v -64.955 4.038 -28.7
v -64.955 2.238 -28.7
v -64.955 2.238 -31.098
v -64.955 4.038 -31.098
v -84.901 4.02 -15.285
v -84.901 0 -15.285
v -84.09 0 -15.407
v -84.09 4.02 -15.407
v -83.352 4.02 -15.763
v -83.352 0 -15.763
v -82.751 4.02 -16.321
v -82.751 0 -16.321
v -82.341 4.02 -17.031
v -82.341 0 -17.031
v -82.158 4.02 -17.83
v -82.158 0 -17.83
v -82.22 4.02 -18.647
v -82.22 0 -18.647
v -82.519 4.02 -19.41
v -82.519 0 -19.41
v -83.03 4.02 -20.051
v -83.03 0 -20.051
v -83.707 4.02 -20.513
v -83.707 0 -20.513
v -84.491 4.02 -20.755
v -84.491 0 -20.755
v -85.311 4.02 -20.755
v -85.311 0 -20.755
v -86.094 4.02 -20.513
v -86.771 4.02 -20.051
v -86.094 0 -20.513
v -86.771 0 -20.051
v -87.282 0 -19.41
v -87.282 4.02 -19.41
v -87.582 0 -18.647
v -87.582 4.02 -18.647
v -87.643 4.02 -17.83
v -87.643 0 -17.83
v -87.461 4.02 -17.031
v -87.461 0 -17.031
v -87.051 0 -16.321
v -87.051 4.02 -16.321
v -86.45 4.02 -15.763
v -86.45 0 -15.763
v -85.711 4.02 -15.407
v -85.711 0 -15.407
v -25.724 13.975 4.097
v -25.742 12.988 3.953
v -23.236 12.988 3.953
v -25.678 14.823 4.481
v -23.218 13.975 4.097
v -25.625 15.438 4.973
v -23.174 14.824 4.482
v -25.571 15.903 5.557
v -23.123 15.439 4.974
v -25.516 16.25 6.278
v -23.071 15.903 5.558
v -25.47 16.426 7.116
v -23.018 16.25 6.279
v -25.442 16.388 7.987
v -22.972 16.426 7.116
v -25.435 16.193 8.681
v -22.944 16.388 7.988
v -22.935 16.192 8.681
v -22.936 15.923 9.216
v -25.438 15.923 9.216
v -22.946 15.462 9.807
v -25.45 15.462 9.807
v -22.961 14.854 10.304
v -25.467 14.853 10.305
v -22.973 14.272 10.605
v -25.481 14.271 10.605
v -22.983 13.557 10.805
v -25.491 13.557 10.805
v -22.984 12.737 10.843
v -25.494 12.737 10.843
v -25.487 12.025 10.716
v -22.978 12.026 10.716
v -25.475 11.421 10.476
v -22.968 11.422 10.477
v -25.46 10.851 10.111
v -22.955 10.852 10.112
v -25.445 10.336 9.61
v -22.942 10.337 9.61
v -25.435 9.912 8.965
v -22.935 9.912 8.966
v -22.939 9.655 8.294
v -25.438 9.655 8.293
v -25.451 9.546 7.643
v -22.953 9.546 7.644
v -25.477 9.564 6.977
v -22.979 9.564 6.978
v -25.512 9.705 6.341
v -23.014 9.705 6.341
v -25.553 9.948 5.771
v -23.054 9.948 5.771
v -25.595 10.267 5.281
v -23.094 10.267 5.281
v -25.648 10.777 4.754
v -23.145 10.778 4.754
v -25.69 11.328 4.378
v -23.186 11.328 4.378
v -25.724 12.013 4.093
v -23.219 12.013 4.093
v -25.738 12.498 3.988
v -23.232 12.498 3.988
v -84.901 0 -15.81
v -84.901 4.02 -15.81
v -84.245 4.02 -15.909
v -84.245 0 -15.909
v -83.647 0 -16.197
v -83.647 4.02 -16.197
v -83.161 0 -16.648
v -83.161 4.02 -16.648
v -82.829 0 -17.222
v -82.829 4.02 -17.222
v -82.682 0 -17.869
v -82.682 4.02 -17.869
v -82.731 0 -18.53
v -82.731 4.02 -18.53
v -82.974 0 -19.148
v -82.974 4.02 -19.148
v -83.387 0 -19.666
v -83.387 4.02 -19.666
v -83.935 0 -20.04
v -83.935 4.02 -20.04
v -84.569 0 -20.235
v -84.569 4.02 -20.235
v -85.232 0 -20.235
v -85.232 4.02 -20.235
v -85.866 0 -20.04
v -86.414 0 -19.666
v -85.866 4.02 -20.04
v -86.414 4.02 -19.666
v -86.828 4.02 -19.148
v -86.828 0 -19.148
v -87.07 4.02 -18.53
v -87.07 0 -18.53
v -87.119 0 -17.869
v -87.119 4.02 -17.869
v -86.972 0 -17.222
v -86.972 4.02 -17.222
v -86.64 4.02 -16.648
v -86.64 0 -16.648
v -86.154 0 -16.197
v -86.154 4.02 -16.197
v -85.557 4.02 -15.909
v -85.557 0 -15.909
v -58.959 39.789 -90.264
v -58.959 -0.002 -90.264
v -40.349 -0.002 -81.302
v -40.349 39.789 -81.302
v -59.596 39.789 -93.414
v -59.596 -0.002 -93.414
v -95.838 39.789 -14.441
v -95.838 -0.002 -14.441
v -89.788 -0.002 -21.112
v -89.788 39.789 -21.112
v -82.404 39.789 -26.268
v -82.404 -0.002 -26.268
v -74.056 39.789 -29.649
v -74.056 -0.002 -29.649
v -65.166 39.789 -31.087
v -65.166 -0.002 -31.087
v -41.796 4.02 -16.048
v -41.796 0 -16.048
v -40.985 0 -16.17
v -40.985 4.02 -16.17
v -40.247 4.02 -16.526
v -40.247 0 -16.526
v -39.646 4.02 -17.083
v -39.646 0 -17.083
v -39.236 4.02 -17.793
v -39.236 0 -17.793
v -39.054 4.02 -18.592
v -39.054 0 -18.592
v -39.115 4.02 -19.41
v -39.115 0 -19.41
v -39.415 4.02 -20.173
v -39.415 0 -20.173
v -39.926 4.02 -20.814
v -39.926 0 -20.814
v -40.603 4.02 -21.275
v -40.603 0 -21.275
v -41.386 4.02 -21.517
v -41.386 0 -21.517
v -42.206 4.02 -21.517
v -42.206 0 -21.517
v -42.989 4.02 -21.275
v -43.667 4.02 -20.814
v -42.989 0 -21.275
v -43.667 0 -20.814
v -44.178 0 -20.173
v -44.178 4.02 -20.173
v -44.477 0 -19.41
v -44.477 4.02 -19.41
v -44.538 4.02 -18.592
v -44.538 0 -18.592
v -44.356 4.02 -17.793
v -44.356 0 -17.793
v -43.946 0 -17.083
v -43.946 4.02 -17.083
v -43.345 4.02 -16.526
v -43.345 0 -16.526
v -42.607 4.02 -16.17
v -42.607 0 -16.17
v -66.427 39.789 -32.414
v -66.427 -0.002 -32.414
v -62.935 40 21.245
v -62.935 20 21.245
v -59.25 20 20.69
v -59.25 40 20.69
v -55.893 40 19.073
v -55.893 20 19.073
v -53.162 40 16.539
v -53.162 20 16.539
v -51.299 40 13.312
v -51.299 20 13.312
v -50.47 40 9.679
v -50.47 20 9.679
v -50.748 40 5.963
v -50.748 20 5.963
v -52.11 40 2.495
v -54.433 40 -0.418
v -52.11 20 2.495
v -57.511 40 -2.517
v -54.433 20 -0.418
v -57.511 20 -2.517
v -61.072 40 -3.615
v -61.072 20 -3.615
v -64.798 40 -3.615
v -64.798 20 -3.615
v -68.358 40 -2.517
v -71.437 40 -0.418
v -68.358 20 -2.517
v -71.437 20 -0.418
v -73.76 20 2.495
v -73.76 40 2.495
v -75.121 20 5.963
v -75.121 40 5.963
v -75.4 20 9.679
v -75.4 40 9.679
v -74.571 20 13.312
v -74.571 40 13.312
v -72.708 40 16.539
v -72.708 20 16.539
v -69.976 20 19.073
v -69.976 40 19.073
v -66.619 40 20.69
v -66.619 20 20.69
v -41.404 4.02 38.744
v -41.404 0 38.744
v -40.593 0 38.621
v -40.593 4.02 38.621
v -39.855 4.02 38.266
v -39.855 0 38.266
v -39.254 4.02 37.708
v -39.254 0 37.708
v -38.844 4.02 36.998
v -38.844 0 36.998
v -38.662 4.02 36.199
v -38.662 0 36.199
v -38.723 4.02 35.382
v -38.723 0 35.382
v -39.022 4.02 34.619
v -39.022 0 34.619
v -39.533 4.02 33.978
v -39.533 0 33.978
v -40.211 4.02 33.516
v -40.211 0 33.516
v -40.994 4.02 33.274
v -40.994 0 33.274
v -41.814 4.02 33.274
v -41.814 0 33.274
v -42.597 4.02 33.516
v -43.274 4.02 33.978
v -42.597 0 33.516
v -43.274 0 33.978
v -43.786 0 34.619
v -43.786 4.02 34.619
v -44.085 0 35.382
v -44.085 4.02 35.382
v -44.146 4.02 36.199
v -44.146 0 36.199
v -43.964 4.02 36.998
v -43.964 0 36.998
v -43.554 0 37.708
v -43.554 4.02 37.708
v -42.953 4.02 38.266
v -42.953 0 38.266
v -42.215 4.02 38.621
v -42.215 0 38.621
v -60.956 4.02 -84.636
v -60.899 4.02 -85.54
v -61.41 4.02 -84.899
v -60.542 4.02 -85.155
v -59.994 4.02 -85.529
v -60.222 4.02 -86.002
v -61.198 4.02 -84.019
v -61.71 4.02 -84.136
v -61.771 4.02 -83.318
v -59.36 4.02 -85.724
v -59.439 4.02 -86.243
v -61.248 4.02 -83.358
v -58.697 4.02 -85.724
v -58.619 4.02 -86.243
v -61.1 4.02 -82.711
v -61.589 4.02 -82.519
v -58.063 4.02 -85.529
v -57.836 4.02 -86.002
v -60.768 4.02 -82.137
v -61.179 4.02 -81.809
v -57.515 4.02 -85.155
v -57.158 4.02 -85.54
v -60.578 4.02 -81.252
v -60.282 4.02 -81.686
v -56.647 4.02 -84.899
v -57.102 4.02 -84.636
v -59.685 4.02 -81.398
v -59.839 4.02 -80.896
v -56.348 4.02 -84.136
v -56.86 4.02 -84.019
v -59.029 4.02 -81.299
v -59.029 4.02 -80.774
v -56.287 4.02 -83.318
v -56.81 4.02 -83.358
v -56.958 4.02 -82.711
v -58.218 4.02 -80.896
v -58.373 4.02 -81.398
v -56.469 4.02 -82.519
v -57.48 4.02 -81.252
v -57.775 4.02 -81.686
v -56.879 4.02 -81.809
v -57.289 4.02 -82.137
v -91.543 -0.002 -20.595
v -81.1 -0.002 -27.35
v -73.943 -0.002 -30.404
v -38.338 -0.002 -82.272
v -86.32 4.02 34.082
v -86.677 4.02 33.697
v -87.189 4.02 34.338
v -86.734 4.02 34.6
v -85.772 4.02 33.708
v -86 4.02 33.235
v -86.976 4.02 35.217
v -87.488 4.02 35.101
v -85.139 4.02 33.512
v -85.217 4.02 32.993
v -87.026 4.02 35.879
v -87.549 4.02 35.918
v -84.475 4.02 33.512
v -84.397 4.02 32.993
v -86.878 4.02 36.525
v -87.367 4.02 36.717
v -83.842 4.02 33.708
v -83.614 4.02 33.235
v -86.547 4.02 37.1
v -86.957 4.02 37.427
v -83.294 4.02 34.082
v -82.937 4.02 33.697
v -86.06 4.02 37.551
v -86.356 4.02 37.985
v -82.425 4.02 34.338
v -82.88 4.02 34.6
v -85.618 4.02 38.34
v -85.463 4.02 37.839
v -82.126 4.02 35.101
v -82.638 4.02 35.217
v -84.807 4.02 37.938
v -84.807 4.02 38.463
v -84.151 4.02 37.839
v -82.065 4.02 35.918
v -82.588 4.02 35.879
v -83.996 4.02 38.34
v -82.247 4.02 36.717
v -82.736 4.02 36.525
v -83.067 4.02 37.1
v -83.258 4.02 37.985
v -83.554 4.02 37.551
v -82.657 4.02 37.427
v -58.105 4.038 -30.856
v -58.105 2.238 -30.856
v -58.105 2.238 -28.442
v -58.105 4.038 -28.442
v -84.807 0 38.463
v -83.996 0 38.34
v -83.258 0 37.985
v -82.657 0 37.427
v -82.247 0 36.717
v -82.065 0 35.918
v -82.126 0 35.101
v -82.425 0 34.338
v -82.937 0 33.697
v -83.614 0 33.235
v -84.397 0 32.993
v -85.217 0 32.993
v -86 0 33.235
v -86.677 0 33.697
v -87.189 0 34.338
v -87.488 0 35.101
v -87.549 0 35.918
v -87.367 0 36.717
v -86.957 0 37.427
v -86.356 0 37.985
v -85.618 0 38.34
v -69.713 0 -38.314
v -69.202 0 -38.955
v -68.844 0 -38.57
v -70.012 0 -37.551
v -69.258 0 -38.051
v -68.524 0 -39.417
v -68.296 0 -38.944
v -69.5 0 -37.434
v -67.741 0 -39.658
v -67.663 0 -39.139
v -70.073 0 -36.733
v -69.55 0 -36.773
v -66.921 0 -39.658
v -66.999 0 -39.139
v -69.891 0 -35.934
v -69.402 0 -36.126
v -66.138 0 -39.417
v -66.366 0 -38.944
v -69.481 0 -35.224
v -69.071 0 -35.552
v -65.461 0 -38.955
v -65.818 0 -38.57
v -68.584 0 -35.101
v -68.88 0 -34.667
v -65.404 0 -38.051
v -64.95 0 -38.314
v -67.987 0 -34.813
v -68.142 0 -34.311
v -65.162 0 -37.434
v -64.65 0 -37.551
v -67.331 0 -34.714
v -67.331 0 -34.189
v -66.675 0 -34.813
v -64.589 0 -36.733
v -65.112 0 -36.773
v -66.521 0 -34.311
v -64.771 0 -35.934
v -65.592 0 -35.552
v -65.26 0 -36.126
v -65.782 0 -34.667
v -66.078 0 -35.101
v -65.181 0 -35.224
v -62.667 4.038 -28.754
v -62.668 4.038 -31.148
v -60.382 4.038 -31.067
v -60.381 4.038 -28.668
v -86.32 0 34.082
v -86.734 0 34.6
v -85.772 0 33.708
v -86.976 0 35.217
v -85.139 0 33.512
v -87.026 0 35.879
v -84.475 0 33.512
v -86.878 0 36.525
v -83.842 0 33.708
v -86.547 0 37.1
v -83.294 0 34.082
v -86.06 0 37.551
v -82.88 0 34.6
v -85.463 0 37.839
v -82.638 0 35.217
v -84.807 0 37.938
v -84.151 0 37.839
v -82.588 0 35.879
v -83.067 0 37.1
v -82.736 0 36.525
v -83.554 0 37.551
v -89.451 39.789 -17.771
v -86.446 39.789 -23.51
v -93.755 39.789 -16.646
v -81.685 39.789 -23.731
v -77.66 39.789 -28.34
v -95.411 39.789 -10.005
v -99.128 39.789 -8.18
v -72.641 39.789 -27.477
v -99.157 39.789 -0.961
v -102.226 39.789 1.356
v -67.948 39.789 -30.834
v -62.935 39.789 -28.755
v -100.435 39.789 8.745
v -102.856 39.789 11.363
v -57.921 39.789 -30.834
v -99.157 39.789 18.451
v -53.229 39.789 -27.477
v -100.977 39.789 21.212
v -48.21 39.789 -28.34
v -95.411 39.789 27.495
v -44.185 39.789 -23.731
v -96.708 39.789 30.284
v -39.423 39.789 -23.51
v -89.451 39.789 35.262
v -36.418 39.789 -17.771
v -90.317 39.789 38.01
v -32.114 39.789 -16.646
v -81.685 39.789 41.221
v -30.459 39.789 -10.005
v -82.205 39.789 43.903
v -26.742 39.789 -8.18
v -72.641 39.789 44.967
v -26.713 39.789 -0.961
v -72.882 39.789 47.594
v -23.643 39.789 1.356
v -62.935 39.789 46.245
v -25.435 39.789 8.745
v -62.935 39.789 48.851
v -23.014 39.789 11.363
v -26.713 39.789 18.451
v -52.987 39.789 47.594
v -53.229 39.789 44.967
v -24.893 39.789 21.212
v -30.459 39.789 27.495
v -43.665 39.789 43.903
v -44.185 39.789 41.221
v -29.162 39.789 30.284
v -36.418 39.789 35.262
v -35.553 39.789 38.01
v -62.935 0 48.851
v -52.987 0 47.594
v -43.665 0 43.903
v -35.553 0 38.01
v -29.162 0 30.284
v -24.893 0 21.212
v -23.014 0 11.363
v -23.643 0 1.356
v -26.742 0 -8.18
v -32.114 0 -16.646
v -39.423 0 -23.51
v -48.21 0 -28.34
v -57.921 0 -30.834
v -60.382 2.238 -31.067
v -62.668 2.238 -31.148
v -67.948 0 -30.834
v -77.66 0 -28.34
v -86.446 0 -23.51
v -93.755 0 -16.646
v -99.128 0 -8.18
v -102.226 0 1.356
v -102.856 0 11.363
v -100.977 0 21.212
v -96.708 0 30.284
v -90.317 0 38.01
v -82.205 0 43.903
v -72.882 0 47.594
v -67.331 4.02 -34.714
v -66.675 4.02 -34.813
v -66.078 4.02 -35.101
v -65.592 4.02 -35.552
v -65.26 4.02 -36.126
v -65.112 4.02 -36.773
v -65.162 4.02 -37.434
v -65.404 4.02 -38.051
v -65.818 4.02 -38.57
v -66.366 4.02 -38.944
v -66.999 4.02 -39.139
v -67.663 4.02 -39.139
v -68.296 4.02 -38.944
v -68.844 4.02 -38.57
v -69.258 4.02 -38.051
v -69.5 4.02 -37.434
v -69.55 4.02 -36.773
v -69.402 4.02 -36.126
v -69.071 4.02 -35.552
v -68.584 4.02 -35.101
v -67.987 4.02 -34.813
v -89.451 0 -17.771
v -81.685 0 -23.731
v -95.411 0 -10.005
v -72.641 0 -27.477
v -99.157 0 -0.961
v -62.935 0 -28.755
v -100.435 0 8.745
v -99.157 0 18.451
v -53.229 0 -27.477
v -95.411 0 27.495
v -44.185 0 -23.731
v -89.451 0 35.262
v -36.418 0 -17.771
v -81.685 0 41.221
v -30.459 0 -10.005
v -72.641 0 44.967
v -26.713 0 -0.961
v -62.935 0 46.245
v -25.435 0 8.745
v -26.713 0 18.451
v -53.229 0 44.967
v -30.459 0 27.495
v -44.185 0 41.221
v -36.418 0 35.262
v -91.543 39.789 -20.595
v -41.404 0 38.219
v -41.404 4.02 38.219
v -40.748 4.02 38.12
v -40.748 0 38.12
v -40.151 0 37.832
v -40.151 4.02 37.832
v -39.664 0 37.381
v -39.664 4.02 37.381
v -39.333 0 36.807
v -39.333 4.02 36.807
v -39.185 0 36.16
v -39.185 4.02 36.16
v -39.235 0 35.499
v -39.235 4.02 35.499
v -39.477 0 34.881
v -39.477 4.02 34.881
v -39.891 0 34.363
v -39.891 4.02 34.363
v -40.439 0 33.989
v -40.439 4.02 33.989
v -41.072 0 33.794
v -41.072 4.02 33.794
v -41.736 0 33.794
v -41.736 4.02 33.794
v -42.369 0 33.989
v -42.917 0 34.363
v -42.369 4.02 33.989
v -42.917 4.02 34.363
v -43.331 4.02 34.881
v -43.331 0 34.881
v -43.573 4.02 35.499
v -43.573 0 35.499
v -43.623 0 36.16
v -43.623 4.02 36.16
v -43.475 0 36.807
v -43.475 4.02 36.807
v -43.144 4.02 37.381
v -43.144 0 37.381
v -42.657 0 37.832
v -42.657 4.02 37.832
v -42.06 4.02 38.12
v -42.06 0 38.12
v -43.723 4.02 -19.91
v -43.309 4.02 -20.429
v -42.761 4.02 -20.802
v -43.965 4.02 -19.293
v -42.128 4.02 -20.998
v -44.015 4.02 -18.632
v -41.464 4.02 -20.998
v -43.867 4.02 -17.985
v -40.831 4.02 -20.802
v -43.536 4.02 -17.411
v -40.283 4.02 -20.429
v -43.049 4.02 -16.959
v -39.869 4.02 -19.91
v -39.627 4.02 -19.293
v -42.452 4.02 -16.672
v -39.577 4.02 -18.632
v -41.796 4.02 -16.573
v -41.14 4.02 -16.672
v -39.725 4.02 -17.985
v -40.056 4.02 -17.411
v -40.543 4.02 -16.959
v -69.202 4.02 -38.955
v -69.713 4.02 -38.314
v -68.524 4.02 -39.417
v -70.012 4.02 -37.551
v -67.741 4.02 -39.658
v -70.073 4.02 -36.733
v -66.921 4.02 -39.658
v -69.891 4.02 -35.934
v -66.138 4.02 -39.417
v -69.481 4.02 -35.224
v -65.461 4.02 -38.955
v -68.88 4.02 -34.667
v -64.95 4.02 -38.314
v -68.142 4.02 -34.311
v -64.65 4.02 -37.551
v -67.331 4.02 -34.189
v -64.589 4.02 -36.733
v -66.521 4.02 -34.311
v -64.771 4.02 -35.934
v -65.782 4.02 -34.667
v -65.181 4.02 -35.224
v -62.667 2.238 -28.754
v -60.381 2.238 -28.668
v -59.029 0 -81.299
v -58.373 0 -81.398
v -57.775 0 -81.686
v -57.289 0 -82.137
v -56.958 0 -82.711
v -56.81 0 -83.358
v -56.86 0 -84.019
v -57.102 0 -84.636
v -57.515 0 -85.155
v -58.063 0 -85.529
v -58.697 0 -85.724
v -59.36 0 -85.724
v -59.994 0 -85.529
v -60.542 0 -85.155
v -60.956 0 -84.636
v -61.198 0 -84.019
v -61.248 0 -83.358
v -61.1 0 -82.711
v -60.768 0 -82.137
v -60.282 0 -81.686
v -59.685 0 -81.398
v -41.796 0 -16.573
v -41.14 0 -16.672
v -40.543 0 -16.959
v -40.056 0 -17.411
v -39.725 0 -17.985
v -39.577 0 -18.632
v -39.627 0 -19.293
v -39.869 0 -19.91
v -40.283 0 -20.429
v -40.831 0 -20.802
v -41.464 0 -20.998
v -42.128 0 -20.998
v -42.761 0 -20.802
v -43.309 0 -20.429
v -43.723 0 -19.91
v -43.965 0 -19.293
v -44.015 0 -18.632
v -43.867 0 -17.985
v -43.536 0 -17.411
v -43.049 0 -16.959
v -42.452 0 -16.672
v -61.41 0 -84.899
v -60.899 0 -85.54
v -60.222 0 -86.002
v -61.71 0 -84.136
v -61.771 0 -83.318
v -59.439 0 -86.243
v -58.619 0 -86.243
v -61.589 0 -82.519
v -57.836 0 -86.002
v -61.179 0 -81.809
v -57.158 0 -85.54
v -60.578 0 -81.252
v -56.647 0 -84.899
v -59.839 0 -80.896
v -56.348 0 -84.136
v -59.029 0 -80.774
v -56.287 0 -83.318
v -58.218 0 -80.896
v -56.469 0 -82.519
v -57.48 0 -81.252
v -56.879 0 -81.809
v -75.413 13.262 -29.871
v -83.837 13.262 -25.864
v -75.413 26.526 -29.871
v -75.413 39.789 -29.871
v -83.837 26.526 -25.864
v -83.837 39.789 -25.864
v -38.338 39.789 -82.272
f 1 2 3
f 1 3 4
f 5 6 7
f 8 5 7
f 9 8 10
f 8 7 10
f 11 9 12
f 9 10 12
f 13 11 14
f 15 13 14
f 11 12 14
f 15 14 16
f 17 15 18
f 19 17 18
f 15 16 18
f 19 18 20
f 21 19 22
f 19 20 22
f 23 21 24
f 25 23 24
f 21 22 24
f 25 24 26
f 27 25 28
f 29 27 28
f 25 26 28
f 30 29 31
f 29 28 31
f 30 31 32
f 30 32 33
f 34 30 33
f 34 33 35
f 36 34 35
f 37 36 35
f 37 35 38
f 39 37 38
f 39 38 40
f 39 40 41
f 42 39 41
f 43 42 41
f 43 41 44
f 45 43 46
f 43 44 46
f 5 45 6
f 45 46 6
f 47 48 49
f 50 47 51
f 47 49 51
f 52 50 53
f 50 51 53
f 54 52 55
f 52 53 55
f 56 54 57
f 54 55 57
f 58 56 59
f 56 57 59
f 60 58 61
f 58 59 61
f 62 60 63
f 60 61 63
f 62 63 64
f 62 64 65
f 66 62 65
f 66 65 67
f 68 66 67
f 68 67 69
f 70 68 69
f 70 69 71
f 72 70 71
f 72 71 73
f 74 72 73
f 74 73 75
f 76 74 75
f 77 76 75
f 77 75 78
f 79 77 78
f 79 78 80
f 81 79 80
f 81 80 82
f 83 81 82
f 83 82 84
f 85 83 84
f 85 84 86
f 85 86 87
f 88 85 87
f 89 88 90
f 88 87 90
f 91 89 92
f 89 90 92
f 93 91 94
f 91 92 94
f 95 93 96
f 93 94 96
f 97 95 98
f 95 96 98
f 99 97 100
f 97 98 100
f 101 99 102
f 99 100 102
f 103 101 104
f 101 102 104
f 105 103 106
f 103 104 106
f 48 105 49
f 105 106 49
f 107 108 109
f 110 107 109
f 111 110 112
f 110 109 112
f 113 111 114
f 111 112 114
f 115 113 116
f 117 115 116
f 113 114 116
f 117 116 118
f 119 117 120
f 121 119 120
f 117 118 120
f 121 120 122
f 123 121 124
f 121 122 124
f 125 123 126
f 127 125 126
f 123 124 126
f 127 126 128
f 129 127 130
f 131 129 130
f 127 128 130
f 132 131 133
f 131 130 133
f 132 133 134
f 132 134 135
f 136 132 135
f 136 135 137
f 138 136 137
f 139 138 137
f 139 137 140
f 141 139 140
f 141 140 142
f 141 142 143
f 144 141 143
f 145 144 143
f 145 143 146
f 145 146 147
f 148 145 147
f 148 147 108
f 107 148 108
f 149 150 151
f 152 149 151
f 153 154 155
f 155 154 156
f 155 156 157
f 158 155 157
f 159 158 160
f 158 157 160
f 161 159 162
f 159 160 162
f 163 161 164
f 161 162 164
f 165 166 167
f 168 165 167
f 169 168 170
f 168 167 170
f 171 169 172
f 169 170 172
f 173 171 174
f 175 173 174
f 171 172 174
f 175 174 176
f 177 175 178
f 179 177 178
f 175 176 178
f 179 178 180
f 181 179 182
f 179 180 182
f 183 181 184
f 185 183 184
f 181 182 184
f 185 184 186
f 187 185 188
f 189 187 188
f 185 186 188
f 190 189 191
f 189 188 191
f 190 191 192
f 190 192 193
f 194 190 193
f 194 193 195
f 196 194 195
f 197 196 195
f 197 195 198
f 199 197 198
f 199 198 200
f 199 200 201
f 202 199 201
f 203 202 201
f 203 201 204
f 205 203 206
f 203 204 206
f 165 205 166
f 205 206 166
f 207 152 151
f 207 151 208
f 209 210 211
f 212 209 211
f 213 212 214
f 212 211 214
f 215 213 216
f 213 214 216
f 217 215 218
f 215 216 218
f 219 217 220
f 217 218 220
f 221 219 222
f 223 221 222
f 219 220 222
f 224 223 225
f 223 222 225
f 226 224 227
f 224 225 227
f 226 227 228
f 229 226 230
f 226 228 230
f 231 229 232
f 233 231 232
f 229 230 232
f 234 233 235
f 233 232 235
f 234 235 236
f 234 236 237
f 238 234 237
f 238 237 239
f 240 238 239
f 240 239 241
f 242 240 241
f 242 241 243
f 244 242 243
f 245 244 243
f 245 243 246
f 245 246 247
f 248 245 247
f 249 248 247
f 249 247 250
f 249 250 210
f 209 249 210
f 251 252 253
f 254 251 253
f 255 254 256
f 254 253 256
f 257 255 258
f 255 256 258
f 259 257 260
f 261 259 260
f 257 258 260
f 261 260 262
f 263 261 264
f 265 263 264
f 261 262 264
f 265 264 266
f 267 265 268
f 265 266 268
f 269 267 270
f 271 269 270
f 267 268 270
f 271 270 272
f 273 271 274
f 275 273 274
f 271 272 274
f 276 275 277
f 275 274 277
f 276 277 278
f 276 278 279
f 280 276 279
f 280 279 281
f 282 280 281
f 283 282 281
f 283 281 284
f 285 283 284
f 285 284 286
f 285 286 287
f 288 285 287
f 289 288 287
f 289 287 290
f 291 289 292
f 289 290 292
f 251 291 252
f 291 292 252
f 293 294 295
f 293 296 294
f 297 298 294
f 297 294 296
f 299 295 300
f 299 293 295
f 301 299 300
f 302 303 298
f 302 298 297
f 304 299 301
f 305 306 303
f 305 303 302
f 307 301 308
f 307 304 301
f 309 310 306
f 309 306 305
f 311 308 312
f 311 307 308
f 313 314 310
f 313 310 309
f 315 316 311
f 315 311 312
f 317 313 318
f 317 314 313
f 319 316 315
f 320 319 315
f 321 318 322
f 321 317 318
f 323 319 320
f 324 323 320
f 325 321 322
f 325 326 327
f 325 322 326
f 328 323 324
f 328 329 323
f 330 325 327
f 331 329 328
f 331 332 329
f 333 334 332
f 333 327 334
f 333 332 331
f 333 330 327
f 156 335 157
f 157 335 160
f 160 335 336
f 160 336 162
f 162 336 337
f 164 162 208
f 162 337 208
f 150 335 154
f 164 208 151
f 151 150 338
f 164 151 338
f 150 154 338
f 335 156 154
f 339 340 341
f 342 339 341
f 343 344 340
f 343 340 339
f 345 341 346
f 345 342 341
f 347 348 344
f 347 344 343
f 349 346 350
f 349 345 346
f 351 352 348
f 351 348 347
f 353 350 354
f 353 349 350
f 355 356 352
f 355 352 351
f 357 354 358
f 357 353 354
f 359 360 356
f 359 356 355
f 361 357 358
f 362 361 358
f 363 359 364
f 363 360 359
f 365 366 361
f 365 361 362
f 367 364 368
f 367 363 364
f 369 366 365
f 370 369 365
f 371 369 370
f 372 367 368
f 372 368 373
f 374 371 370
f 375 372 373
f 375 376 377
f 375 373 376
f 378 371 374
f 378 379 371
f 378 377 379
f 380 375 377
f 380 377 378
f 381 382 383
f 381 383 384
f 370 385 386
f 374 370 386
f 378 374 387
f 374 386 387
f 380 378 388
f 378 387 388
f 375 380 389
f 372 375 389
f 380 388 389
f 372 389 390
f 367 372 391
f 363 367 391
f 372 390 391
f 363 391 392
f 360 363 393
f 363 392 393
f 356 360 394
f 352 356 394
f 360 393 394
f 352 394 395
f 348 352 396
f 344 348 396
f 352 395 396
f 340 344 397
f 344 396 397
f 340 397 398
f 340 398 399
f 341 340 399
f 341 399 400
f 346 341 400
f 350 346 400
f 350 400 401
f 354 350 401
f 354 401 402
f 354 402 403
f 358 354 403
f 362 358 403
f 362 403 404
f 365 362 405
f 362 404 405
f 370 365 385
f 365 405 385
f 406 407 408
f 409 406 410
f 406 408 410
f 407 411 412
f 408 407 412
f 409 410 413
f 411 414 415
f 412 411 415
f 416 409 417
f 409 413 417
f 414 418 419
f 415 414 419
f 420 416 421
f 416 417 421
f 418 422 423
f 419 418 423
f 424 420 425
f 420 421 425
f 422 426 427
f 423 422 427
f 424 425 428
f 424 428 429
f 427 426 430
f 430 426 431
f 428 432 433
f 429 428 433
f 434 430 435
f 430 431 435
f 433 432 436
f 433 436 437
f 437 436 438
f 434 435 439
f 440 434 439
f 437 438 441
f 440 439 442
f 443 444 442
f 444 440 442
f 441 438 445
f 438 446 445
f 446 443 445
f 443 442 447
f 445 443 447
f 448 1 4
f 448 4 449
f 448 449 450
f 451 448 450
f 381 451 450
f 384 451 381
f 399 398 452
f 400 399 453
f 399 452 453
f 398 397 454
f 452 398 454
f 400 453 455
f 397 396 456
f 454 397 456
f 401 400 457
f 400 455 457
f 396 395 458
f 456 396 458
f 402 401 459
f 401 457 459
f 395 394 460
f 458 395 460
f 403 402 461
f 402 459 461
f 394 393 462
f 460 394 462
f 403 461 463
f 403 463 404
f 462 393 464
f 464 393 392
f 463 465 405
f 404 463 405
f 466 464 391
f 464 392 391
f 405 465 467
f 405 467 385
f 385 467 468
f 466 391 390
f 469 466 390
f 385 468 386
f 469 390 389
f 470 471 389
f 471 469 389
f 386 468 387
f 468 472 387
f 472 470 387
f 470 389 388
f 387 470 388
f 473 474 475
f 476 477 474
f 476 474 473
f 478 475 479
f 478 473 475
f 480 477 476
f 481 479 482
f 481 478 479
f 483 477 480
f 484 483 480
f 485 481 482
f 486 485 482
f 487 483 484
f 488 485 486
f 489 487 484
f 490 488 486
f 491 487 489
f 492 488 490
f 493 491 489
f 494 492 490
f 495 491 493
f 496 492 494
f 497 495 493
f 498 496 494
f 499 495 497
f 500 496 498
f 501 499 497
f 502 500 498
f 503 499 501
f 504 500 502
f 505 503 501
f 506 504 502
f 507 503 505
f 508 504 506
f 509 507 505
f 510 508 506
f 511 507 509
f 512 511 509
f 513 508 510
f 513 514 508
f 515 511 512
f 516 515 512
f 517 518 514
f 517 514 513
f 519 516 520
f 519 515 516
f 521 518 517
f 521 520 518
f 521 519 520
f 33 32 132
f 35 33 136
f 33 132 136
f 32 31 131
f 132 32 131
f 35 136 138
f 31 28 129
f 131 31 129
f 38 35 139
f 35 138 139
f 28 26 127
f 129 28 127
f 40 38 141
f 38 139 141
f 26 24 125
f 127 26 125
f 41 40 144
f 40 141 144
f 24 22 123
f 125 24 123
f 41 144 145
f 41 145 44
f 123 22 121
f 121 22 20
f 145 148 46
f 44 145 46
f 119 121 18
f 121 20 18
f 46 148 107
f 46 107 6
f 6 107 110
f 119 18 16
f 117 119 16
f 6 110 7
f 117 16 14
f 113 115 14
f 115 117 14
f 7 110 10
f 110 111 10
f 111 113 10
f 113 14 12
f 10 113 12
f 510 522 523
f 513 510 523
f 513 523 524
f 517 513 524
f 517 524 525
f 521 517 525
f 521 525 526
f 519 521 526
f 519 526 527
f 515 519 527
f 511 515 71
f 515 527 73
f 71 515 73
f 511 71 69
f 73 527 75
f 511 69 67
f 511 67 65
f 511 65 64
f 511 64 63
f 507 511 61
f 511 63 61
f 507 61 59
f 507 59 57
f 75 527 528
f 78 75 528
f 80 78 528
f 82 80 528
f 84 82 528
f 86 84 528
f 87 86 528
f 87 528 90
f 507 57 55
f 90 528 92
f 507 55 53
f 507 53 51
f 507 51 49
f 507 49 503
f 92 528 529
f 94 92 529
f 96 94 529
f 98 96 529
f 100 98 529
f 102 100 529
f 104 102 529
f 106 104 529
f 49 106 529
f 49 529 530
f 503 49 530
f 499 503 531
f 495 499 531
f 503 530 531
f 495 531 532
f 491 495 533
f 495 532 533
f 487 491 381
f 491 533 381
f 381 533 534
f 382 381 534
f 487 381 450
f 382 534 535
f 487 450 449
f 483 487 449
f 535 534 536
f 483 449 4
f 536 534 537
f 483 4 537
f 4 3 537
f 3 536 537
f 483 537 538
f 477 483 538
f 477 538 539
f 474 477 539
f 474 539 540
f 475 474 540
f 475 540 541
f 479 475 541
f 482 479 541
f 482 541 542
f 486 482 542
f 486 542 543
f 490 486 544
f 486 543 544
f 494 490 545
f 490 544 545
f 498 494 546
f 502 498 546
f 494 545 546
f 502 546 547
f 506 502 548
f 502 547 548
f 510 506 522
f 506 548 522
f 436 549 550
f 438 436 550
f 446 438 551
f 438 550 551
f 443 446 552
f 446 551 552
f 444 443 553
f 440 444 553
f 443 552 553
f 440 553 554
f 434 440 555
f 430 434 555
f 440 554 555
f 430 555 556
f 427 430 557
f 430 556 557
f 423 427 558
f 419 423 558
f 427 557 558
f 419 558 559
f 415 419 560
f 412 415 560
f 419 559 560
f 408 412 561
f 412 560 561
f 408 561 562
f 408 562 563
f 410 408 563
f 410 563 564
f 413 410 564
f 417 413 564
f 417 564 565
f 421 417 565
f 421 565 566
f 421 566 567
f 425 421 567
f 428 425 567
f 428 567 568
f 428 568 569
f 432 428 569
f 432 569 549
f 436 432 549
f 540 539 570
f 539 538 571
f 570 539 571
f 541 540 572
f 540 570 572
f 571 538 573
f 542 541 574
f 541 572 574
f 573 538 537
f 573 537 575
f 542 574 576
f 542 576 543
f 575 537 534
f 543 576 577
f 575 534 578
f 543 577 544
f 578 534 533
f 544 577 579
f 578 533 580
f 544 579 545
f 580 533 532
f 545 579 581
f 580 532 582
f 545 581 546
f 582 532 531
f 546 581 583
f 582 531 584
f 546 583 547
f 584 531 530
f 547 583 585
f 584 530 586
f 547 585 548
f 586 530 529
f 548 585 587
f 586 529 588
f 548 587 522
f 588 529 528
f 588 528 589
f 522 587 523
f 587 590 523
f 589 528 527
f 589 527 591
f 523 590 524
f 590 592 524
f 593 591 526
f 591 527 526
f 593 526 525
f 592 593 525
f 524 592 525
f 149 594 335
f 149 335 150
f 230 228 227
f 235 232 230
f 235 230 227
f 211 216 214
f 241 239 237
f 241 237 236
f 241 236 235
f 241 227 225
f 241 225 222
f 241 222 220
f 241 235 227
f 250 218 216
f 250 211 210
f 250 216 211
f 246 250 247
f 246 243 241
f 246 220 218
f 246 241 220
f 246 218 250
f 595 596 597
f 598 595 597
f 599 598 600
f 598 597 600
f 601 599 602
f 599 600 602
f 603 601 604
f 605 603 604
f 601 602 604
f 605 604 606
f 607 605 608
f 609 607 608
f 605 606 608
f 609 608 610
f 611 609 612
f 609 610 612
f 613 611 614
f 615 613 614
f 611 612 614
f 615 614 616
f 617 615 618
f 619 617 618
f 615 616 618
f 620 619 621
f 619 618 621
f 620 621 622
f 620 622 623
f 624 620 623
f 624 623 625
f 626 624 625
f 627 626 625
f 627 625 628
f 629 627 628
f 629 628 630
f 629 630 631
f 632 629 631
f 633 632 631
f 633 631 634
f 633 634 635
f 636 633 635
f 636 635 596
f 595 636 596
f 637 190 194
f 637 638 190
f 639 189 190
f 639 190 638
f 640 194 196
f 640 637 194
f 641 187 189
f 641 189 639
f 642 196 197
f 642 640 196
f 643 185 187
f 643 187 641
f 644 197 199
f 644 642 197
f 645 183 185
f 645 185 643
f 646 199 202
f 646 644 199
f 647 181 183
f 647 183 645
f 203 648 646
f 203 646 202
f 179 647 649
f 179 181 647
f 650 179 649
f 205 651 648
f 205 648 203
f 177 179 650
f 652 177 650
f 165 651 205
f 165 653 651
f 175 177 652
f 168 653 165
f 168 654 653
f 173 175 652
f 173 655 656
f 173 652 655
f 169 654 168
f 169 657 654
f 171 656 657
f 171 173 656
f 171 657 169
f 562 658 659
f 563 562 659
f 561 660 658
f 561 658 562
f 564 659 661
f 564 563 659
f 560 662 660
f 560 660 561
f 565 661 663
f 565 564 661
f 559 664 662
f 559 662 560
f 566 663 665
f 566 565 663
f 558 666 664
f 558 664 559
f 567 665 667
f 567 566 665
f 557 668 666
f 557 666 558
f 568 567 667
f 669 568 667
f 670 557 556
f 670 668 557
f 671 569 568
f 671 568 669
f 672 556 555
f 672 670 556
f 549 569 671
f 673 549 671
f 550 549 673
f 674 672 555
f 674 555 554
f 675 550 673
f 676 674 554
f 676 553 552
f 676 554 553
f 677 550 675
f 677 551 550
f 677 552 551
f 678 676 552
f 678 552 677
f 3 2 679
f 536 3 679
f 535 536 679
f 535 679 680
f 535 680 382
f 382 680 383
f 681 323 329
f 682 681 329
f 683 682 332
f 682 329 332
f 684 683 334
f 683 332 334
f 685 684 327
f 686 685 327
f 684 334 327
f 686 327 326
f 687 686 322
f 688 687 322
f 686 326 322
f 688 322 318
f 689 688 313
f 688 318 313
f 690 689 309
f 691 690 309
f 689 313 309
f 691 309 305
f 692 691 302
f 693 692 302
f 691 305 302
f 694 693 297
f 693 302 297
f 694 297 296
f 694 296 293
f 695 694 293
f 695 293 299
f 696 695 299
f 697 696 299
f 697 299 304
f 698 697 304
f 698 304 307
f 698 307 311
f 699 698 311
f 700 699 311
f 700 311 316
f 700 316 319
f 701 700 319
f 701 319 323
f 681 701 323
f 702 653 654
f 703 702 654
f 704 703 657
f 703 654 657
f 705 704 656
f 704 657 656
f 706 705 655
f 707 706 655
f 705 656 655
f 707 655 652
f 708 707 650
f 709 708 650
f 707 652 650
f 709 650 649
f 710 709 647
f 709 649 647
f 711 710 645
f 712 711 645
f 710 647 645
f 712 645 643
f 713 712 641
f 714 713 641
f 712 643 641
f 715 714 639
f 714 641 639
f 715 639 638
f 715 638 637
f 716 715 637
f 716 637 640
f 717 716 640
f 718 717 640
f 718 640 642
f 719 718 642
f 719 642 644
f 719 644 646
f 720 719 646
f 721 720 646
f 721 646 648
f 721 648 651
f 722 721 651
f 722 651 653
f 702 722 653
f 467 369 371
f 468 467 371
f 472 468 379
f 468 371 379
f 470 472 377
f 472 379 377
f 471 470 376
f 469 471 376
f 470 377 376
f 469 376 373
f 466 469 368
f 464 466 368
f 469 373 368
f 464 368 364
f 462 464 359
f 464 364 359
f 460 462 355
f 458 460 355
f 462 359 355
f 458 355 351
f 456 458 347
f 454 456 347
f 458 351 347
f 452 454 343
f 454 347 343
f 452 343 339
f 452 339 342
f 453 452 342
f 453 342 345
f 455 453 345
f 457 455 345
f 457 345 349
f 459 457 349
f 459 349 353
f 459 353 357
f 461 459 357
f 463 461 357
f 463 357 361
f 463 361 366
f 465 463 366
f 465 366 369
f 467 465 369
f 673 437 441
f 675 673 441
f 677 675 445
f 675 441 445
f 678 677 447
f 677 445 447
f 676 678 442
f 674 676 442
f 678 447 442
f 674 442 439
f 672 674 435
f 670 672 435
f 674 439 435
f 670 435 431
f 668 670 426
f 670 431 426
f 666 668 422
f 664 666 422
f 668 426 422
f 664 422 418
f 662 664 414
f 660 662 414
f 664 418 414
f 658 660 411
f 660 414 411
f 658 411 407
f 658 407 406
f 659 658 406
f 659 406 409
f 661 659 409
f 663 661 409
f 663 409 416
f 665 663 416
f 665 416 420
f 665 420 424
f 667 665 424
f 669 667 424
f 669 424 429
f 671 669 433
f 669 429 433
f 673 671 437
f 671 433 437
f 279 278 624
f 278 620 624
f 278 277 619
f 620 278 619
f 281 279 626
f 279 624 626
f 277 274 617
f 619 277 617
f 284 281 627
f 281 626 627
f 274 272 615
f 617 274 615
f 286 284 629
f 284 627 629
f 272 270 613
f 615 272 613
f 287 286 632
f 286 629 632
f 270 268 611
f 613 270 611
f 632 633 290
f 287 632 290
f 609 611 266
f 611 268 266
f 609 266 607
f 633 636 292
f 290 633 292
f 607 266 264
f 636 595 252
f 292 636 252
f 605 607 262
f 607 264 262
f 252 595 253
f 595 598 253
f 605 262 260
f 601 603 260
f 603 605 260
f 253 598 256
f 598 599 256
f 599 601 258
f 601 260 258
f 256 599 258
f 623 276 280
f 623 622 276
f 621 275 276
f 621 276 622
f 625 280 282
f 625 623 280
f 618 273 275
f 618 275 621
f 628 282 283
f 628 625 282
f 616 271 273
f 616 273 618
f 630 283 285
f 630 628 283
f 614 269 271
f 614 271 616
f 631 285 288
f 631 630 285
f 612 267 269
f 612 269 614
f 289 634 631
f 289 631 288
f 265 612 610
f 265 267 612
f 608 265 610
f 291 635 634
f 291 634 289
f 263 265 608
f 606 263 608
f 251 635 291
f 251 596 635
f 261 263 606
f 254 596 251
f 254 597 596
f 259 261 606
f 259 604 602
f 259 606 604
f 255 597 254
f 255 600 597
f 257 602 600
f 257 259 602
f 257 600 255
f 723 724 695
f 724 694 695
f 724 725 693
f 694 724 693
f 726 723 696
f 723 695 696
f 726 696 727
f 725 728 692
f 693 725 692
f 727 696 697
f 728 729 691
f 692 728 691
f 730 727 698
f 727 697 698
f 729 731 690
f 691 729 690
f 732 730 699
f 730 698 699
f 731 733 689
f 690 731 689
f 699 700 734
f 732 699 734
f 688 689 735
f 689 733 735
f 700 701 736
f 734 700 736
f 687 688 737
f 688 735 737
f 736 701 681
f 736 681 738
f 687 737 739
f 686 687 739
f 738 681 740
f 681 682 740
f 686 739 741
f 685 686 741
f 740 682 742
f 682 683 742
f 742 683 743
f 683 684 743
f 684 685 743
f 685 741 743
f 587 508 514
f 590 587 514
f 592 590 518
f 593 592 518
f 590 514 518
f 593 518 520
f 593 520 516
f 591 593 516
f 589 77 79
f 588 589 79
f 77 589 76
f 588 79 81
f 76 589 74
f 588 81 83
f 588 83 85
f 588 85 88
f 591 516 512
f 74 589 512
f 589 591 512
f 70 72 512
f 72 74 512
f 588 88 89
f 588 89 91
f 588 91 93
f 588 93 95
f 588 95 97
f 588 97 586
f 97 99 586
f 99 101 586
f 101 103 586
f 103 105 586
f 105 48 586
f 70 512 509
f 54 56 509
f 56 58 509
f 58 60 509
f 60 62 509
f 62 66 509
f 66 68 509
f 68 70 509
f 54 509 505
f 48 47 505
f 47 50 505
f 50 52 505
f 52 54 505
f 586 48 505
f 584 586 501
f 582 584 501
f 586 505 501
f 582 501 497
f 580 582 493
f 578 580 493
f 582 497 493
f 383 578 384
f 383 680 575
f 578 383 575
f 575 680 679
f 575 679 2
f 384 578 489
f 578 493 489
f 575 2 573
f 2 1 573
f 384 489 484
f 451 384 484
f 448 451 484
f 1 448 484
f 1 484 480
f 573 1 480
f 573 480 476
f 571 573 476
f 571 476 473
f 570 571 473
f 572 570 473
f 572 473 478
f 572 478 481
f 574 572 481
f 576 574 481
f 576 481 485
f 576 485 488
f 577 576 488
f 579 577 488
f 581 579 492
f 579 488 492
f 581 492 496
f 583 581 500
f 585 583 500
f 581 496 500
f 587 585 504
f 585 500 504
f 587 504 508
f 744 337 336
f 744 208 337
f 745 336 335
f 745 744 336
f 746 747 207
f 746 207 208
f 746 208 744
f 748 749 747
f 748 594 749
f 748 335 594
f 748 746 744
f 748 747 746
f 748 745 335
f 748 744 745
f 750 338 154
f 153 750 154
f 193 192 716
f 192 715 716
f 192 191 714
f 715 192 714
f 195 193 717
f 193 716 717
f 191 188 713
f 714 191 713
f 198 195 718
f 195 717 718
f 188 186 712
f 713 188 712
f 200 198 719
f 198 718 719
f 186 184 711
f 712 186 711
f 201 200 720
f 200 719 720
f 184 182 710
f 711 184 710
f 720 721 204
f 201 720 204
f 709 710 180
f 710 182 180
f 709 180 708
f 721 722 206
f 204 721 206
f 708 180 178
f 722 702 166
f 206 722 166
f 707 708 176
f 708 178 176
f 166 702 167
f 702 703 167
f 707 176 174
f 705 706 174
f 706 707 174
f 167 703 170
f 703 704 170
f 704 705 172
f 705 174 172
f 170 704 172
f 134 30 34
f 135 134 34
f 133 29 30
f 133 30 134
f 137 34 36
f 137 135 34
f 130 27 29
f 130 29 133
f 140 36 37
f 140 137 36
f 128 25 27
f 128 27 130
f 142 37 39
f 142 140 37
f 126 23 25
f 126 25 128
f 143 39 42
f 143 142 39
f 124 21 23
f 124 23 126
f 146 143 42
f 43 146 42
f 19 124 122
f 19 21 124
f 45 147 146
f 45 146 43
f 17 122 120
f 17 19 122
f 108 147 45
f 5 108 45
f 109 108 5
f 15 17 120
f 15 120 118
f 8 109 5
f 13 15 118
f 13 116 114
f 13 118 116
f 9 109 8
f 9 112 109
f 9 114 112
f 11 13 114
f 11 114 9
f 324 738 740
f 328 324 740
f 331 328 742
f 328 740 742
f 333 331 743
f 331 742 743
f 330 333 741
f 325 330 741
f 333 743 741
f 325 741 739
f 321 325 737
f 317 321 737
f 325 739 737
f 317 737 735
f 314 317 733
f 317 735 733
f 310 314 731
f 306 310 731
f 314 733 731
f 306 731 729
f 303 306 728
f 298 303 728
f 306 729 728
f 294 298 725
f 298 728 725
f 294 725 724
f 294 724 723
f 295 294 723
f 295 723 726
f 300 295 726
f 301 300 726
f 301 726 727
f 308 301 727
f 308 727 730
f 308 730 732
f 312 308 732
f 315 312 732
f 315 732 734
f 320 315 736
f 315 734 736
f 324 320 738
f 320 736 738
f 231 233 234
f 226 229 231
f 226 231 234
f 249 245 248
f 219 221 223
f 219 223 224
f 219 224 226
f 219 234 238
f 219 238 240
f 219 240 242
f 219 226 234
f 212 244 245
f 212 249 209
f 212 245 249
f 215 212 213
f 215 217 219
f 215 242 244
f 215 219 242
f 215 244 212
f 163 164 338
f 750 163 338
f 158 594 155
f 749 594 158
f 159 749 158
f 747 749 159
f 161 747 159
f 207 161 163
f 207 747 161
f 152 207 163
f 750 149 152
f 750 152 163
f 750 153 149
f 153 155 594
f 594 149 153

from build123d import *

# Parameters (mm, degrees)
SKETCH1_R                = 40
BOSS_EXTRUDE2_DEPTH      = 39.78932127
BOSS_EXTRUDE3_DEPTH      = 0.0001
BOSS_EXTRUDE3_DEPTH_BACK = 39.791091685
SKETCH6_R                = 37.5
CUT_EXTRUDE3_DEPTH       = 145.58565744
CUT_EXTRUDE4_DEPTH       = 145.585684961
BOSS_EXTRUDE5_DEPTH      = 40
BOSS_EXTRUDE5_DEPTH_BACK = 0.0001
SKETCH10_R               = 12.5
SKETCH11_R               = 2.75
BOSS_EXTRUDE6_DEPTH      = 4.02
BOSS_EXTRUDE6_2_DEPTH    = 4.02
BOSS_EXTRUDE6_3_DEPTH    = 4.02
BOSS_EXTRUDE6_4_DEPTH    = 4.02
BOSS_EXTRUDE6_5_DEPTH    = 4.02
BOSS_EXTRUDE6_6_DEPTH    = 4.02
SKETCH12_R               = 2.225
CUT_EXTRUDE5_DEPTH       = 144.583570712
SKETCH15_R               = 12.5
CUT_EXTRUDE6_DEPTH       = 20
SKETCH20_R               = 3.45
CUT_EXTRUDE15_DEPTH      = 34
SKETCH21_W               = 6.85
SKETCH21_H               = 1.8
CUT_EXTRUDE17_DEPTH      = 34
SKETCH12_2_R             = 2.225
CUT_EXTRUDE18_DEPTH      = 34


with BuildPart() as part:
    # Sketch1 → Boss-Extrude2 (new body)
    with BuildSketch(Plane(origin=(0, 0, 0), x_dir=(1, 0, 0), z_dir=(0, 1, 0))):
        with Locations((-62.934827524, -8.8509938)):
            Circle(SKETCH1_R)
    extrude(amount=BOSS_EXTRUDE2_DEPTH)

    # Sketch6 → Cut-Extrude3 (cut, through all)
    with BuildSketch(Plane(origin=(0, 39.78932127, 0), x_dir=(1, 0, 0), z_dir=(0, 1, 0))):
        with Locations((-62.934827524, -8.745171417)):
            Circle(SKETCH6_R)
    extrude(amount=-CUT_EXTRUDE3_DEPTH, mode=Mode.SUBTRACT)

    # Sketch20 → Cut-Extrude15 (cut)
    with BuildSketch(Plane(origin=(0, 0, 0), x_dir=(0, 0, -1), z_dir=(1, 0, 0))):
        with Locations((-7.402571606, 12.987944342)):
            Circle(SKETCH20_R)
    extrude(amount=-CUT_EXTRUDE15_DEPTH, mode=Mode.SUBTRACT)

    # Sketch21 → Cut-Extrude17 (cut)
    with BuildSketch(Plane.XY):
        with Locations((-61.529597063, 3.138215431)):
            Rectangle(SKETCH21_W, SKETCH21_H)
    extrude(amount=-CUT_EXTRUDE17_DEPTH, mode=Mode.SUBTRACT)


with BuildPart() as body_2:
    # Sketch2 → Boss-Extrude3 (new, two sides: drawn at the far end of the back side and taken through both)
    with BuildSketch(Plane(origin=(0, 39.78932127, 0), x_dir=(1, 0, 0), z_dir=(0, 1, 0)).offset(-BOSS_EXTRUDE3_DEPTH_BACK)):
        with BuildLine():
            Line((-65.165650645, 31.086750605), (-38.338403536, 82.2723051))
            Line((-38.338403536, 82.2723051), (-59.595668461, 93.413610585))
            Line((-59.595668461, 93.413610585), (-95.838477685, 14.44085743))
            ThreePointArc((-95.838477685, 14.44085743), (-82.403548817, 26.26760578), (-65.165650645, 31.086750605))
        make_face()
    extrude(amount=BOSS_EXTRUDE3_DEPTH + BOSS_EXTRUDE3_DEPTH_BACK)

    # Sketch9 → Cut-Extrude4 (cut, through all)
    with BuildSketch(Plane(origin=(0, 39.78942127, 0), x_dir=(1, 0, 0), z_dir=(0, 1, 0))):
        with BuildLine():
            Line((-58.959359155, 90.26371428), (-40.348519963, 81.302010849))
            Line((-40.348519963, 81.302010849), (-66.426872292, 32.413752837))
            add(Edge.make_bspline(
                [(-66.426872292, 32.413752837), (-75.640635654, 30.670480402), (-84.248783768, 26.427484872), (-91.543463784, 20.594922289)],
                knots=[0, 0, 0, 0, 1, 1, 1, 1], degree=3))
            Line((-91.543463784, 20.594922289), (-58.959359155, 90.26371428))
        make_face()
    extrude(amount=-CUT_EXTRUDE4_DEPTH, mode=Mode.SUBTRACT)


with BuildPart() as body_3:
    # Sketch10 → Boss-Extrude5 (new, two sides: drawn at the far end of the back side and taken through both)
    with BuildSketch(Plane(origin=(0, 0, 0), x_dir=(1, 0, 0), z_dir=(0, 1, 0)).offset(-BOSS_EXTRUDE5_DEPTH_BACK)):
        with Locations((-62.934827524, -8.744998299)):
            Circle(SKETCH10_R)
    extrude(amount=BOSS_EXTRUDE5_DEPTH + BOSS_EXTRUDE5_DEPTH_BACK)

    # Sketch15 → Cut-Extrude6 (cut)
    with BuildSketch(Plane.XZ.offset(0.0001)):
        with Locations((-62.934827524, 8.744998299)):
            Circle(SKETCH15_R)
    extrude(amount=-CUT_EXTRUDE6_DEPTH, mode=Mode.SUBTRACT)


with BuildPart() as body_4:
    # Sketch11 → Boss-Extrude6 (new body)
    with BuildSketch(Plane(origin=(0, 0, 0), x_dir=(1, 0, 0), z_dir=(0, 1, 0))):
        with Locations((-84.900677015, 18.035237824)):
            Circle(SKETCH11_R)
    extrude(amount=BOSS_EXTRUDE6_DEPTH)


with BuildPart() as body_5:
    # Sketch11 → Boss-Extrude6 2 (new body)
    with BuildSketch(Plane(origin=(0, 0, 0), x_dir=(1, 0, 0), z_dir=(0, 1, 0))):
        with Locations((-41.796072931, 18.79783428)):
            Circle(SKETCH11_R)
    extrude(amount=BOSS_EXTRUDE6_2_DEPTH)


with BuildPart() as body_6:
    # Sketch11 → Boss-Extrude6 3 (new body)
    with BuildSketch(Plane(origin=(0, 0, 0), x_dir=(1, 0, 0), z_dir=(0, 1, 0))):
        with Locations((-84.807000271, -35.712593361)):
            Circle(SKETCH11_R)
    extrude(amount=BOSS_EXTRUDE6_3_DEPTH)


with BuildPart() as body_7:
    # Sketch11 → Boss-Extrude6 4 (new body)
    with BuildSketch(Plane(origin=(0, 0, 0), x_dir=(1, 0, 0), z_dir=(0, 1, 0))):
        with Locations((-41.403931801, -35.993648692)):
            Circle(SKETCH11_R)
    extrude(amount=BOSS_EXTRUDE6_4_DEPTH)


with BuildPart() as body_8:
    # Sketch11 → Boss-Extrude6 5 (new body)
    with BuildSketch(Plane(origin=(0, 0, 0), x_dir=(1, 0, 0), z_dir=(0, 1, 0))):
        with Locations((-59.028864713, 83.523966767)):
            Circle(SKETCH11_R)
    extrude(amount=BOSS_EXTRUDE6_5_DEPTH)


with BuildPart() as body_9:
    # Sketch11 → Boss-Extrude6 6 (new body)
    with BuildSketch(Plane(origin=(0, 0, 0), x_dir=(1, 0, 0), z_dir=(0, 1, 0))):
        with Locations((-67.331101039, 36.938888632)):
            Circle(SKETCH11_R)
    extrude(amount=BOSS_EXTRUDE6_6_DEPTH)


with BuildPart() as cut_extrude5_tool:
    # Sketch12 → Cut-Extrude5 (new, through all)
    with BuildSketch(Plane(origin=(0, 4.02, 0), x_dir=(1, 0, 0), z_dir=(0, 1, 0))):
        with Locations((-84.900677015, 18.035237824)):
            Circle(SKETCH12_R)
        with Locations((-84.807000271, -35.712593361)):
            Circle(SKETCH12_R)
        with Locations((-41.796072931, 18.79783428)):
            Circle(SKETCH12_R)
        with Locations((-41.403931801, -35.993648692)):
            Circle(SKETCH12_R)
        with Locations((-67.331101039, 36.938888632)):
            Circle(SKETCH12_R)
        with Locations((-59.028864713, 83.523966767)):
            Circle(SKETCH12_R)
    extrude(amount=-CUT_EXTRUDE5_DEPTH)


with BuildPart() as body_4_1:
    add(body_4.part)

    # Cut-Extrude5: cut by cut_extrude5_tool
    add(cut_extrude5_tool.part, mode=Mode.SUBTRACT)


with BuildPart() as body_5_1:
    add(body_5.part)

    # Cut-Extrude5: cut by cut_extrude5_tool
    add(cut_extrude5_tool.part, mode=Mode.SUBTRACT)


with BuildPart() as body_6_1:
    add(body_6.part)

    # Cut-Extrude5: cut by cut_extrude5_tool
    add(cut_extrude5_tool.part, mode=Mode.SUBTRACT)


with BuildPart() as body_7_1:
    add(body_7.part)

    # Cut-Extrude5: cut by cut_extrude5_tool
    add(cut_extrude5_tool.part, mode=Mode.SUBTRACT)


with BuildPart() as cut_extrude18_tool:
    # Sketch12<2> → Cut-Extrude18 (new body)
    with BuildSketch(Plane(origin=(0, 4.02, 0), x_dir=(1, 0, 0), z_dir=(0, 1, 0))):
        with Locations((-84.900677015, 18.035237824)):
            Circle(SKETCH12_2_R)
        with Locations((-84.807000271, -35.712593361)):
            Circle(SKETCH12_2_R)
        with Locations((-41.796072931, 18.79783428)):
            Circle(SKETCH12_2_R)
        with Locations((-41.403931801, -35.993648692)):
            Circle(SKETCH12_2_R)
        with Locations((-67.331101039, 36.938888632)):
            Circle(SKETCH12_2_R)
        with Locations((-59.028864713, 83.523966767)):
            Circle(SKETCH12_2_R)
    extrude(amount=-CUT_EXTRUDE18_DEPTH)


with BuildPart() as body_8_1:
    add(body_8.part)

    # Cut-Extrude18: cut by cut_extrude18_tool
    add(cut_extrude18_tool.part, mode=Mode.SUBTRACT)


with BuildPart() as body_9_1:
    add(body_9.part)

    # Cut-Extrude18: cut by cut_extrude18_tool
    add(cut_extrude18_tool.part, mode=Mode.SUBTRACT)


solid = Compound([part.part, body_2.part, body_3.part, body_4_1.part, body_5_1.part, body_6_1.part, body_7_1.part, body_8_1.part, body_9_1.part])
